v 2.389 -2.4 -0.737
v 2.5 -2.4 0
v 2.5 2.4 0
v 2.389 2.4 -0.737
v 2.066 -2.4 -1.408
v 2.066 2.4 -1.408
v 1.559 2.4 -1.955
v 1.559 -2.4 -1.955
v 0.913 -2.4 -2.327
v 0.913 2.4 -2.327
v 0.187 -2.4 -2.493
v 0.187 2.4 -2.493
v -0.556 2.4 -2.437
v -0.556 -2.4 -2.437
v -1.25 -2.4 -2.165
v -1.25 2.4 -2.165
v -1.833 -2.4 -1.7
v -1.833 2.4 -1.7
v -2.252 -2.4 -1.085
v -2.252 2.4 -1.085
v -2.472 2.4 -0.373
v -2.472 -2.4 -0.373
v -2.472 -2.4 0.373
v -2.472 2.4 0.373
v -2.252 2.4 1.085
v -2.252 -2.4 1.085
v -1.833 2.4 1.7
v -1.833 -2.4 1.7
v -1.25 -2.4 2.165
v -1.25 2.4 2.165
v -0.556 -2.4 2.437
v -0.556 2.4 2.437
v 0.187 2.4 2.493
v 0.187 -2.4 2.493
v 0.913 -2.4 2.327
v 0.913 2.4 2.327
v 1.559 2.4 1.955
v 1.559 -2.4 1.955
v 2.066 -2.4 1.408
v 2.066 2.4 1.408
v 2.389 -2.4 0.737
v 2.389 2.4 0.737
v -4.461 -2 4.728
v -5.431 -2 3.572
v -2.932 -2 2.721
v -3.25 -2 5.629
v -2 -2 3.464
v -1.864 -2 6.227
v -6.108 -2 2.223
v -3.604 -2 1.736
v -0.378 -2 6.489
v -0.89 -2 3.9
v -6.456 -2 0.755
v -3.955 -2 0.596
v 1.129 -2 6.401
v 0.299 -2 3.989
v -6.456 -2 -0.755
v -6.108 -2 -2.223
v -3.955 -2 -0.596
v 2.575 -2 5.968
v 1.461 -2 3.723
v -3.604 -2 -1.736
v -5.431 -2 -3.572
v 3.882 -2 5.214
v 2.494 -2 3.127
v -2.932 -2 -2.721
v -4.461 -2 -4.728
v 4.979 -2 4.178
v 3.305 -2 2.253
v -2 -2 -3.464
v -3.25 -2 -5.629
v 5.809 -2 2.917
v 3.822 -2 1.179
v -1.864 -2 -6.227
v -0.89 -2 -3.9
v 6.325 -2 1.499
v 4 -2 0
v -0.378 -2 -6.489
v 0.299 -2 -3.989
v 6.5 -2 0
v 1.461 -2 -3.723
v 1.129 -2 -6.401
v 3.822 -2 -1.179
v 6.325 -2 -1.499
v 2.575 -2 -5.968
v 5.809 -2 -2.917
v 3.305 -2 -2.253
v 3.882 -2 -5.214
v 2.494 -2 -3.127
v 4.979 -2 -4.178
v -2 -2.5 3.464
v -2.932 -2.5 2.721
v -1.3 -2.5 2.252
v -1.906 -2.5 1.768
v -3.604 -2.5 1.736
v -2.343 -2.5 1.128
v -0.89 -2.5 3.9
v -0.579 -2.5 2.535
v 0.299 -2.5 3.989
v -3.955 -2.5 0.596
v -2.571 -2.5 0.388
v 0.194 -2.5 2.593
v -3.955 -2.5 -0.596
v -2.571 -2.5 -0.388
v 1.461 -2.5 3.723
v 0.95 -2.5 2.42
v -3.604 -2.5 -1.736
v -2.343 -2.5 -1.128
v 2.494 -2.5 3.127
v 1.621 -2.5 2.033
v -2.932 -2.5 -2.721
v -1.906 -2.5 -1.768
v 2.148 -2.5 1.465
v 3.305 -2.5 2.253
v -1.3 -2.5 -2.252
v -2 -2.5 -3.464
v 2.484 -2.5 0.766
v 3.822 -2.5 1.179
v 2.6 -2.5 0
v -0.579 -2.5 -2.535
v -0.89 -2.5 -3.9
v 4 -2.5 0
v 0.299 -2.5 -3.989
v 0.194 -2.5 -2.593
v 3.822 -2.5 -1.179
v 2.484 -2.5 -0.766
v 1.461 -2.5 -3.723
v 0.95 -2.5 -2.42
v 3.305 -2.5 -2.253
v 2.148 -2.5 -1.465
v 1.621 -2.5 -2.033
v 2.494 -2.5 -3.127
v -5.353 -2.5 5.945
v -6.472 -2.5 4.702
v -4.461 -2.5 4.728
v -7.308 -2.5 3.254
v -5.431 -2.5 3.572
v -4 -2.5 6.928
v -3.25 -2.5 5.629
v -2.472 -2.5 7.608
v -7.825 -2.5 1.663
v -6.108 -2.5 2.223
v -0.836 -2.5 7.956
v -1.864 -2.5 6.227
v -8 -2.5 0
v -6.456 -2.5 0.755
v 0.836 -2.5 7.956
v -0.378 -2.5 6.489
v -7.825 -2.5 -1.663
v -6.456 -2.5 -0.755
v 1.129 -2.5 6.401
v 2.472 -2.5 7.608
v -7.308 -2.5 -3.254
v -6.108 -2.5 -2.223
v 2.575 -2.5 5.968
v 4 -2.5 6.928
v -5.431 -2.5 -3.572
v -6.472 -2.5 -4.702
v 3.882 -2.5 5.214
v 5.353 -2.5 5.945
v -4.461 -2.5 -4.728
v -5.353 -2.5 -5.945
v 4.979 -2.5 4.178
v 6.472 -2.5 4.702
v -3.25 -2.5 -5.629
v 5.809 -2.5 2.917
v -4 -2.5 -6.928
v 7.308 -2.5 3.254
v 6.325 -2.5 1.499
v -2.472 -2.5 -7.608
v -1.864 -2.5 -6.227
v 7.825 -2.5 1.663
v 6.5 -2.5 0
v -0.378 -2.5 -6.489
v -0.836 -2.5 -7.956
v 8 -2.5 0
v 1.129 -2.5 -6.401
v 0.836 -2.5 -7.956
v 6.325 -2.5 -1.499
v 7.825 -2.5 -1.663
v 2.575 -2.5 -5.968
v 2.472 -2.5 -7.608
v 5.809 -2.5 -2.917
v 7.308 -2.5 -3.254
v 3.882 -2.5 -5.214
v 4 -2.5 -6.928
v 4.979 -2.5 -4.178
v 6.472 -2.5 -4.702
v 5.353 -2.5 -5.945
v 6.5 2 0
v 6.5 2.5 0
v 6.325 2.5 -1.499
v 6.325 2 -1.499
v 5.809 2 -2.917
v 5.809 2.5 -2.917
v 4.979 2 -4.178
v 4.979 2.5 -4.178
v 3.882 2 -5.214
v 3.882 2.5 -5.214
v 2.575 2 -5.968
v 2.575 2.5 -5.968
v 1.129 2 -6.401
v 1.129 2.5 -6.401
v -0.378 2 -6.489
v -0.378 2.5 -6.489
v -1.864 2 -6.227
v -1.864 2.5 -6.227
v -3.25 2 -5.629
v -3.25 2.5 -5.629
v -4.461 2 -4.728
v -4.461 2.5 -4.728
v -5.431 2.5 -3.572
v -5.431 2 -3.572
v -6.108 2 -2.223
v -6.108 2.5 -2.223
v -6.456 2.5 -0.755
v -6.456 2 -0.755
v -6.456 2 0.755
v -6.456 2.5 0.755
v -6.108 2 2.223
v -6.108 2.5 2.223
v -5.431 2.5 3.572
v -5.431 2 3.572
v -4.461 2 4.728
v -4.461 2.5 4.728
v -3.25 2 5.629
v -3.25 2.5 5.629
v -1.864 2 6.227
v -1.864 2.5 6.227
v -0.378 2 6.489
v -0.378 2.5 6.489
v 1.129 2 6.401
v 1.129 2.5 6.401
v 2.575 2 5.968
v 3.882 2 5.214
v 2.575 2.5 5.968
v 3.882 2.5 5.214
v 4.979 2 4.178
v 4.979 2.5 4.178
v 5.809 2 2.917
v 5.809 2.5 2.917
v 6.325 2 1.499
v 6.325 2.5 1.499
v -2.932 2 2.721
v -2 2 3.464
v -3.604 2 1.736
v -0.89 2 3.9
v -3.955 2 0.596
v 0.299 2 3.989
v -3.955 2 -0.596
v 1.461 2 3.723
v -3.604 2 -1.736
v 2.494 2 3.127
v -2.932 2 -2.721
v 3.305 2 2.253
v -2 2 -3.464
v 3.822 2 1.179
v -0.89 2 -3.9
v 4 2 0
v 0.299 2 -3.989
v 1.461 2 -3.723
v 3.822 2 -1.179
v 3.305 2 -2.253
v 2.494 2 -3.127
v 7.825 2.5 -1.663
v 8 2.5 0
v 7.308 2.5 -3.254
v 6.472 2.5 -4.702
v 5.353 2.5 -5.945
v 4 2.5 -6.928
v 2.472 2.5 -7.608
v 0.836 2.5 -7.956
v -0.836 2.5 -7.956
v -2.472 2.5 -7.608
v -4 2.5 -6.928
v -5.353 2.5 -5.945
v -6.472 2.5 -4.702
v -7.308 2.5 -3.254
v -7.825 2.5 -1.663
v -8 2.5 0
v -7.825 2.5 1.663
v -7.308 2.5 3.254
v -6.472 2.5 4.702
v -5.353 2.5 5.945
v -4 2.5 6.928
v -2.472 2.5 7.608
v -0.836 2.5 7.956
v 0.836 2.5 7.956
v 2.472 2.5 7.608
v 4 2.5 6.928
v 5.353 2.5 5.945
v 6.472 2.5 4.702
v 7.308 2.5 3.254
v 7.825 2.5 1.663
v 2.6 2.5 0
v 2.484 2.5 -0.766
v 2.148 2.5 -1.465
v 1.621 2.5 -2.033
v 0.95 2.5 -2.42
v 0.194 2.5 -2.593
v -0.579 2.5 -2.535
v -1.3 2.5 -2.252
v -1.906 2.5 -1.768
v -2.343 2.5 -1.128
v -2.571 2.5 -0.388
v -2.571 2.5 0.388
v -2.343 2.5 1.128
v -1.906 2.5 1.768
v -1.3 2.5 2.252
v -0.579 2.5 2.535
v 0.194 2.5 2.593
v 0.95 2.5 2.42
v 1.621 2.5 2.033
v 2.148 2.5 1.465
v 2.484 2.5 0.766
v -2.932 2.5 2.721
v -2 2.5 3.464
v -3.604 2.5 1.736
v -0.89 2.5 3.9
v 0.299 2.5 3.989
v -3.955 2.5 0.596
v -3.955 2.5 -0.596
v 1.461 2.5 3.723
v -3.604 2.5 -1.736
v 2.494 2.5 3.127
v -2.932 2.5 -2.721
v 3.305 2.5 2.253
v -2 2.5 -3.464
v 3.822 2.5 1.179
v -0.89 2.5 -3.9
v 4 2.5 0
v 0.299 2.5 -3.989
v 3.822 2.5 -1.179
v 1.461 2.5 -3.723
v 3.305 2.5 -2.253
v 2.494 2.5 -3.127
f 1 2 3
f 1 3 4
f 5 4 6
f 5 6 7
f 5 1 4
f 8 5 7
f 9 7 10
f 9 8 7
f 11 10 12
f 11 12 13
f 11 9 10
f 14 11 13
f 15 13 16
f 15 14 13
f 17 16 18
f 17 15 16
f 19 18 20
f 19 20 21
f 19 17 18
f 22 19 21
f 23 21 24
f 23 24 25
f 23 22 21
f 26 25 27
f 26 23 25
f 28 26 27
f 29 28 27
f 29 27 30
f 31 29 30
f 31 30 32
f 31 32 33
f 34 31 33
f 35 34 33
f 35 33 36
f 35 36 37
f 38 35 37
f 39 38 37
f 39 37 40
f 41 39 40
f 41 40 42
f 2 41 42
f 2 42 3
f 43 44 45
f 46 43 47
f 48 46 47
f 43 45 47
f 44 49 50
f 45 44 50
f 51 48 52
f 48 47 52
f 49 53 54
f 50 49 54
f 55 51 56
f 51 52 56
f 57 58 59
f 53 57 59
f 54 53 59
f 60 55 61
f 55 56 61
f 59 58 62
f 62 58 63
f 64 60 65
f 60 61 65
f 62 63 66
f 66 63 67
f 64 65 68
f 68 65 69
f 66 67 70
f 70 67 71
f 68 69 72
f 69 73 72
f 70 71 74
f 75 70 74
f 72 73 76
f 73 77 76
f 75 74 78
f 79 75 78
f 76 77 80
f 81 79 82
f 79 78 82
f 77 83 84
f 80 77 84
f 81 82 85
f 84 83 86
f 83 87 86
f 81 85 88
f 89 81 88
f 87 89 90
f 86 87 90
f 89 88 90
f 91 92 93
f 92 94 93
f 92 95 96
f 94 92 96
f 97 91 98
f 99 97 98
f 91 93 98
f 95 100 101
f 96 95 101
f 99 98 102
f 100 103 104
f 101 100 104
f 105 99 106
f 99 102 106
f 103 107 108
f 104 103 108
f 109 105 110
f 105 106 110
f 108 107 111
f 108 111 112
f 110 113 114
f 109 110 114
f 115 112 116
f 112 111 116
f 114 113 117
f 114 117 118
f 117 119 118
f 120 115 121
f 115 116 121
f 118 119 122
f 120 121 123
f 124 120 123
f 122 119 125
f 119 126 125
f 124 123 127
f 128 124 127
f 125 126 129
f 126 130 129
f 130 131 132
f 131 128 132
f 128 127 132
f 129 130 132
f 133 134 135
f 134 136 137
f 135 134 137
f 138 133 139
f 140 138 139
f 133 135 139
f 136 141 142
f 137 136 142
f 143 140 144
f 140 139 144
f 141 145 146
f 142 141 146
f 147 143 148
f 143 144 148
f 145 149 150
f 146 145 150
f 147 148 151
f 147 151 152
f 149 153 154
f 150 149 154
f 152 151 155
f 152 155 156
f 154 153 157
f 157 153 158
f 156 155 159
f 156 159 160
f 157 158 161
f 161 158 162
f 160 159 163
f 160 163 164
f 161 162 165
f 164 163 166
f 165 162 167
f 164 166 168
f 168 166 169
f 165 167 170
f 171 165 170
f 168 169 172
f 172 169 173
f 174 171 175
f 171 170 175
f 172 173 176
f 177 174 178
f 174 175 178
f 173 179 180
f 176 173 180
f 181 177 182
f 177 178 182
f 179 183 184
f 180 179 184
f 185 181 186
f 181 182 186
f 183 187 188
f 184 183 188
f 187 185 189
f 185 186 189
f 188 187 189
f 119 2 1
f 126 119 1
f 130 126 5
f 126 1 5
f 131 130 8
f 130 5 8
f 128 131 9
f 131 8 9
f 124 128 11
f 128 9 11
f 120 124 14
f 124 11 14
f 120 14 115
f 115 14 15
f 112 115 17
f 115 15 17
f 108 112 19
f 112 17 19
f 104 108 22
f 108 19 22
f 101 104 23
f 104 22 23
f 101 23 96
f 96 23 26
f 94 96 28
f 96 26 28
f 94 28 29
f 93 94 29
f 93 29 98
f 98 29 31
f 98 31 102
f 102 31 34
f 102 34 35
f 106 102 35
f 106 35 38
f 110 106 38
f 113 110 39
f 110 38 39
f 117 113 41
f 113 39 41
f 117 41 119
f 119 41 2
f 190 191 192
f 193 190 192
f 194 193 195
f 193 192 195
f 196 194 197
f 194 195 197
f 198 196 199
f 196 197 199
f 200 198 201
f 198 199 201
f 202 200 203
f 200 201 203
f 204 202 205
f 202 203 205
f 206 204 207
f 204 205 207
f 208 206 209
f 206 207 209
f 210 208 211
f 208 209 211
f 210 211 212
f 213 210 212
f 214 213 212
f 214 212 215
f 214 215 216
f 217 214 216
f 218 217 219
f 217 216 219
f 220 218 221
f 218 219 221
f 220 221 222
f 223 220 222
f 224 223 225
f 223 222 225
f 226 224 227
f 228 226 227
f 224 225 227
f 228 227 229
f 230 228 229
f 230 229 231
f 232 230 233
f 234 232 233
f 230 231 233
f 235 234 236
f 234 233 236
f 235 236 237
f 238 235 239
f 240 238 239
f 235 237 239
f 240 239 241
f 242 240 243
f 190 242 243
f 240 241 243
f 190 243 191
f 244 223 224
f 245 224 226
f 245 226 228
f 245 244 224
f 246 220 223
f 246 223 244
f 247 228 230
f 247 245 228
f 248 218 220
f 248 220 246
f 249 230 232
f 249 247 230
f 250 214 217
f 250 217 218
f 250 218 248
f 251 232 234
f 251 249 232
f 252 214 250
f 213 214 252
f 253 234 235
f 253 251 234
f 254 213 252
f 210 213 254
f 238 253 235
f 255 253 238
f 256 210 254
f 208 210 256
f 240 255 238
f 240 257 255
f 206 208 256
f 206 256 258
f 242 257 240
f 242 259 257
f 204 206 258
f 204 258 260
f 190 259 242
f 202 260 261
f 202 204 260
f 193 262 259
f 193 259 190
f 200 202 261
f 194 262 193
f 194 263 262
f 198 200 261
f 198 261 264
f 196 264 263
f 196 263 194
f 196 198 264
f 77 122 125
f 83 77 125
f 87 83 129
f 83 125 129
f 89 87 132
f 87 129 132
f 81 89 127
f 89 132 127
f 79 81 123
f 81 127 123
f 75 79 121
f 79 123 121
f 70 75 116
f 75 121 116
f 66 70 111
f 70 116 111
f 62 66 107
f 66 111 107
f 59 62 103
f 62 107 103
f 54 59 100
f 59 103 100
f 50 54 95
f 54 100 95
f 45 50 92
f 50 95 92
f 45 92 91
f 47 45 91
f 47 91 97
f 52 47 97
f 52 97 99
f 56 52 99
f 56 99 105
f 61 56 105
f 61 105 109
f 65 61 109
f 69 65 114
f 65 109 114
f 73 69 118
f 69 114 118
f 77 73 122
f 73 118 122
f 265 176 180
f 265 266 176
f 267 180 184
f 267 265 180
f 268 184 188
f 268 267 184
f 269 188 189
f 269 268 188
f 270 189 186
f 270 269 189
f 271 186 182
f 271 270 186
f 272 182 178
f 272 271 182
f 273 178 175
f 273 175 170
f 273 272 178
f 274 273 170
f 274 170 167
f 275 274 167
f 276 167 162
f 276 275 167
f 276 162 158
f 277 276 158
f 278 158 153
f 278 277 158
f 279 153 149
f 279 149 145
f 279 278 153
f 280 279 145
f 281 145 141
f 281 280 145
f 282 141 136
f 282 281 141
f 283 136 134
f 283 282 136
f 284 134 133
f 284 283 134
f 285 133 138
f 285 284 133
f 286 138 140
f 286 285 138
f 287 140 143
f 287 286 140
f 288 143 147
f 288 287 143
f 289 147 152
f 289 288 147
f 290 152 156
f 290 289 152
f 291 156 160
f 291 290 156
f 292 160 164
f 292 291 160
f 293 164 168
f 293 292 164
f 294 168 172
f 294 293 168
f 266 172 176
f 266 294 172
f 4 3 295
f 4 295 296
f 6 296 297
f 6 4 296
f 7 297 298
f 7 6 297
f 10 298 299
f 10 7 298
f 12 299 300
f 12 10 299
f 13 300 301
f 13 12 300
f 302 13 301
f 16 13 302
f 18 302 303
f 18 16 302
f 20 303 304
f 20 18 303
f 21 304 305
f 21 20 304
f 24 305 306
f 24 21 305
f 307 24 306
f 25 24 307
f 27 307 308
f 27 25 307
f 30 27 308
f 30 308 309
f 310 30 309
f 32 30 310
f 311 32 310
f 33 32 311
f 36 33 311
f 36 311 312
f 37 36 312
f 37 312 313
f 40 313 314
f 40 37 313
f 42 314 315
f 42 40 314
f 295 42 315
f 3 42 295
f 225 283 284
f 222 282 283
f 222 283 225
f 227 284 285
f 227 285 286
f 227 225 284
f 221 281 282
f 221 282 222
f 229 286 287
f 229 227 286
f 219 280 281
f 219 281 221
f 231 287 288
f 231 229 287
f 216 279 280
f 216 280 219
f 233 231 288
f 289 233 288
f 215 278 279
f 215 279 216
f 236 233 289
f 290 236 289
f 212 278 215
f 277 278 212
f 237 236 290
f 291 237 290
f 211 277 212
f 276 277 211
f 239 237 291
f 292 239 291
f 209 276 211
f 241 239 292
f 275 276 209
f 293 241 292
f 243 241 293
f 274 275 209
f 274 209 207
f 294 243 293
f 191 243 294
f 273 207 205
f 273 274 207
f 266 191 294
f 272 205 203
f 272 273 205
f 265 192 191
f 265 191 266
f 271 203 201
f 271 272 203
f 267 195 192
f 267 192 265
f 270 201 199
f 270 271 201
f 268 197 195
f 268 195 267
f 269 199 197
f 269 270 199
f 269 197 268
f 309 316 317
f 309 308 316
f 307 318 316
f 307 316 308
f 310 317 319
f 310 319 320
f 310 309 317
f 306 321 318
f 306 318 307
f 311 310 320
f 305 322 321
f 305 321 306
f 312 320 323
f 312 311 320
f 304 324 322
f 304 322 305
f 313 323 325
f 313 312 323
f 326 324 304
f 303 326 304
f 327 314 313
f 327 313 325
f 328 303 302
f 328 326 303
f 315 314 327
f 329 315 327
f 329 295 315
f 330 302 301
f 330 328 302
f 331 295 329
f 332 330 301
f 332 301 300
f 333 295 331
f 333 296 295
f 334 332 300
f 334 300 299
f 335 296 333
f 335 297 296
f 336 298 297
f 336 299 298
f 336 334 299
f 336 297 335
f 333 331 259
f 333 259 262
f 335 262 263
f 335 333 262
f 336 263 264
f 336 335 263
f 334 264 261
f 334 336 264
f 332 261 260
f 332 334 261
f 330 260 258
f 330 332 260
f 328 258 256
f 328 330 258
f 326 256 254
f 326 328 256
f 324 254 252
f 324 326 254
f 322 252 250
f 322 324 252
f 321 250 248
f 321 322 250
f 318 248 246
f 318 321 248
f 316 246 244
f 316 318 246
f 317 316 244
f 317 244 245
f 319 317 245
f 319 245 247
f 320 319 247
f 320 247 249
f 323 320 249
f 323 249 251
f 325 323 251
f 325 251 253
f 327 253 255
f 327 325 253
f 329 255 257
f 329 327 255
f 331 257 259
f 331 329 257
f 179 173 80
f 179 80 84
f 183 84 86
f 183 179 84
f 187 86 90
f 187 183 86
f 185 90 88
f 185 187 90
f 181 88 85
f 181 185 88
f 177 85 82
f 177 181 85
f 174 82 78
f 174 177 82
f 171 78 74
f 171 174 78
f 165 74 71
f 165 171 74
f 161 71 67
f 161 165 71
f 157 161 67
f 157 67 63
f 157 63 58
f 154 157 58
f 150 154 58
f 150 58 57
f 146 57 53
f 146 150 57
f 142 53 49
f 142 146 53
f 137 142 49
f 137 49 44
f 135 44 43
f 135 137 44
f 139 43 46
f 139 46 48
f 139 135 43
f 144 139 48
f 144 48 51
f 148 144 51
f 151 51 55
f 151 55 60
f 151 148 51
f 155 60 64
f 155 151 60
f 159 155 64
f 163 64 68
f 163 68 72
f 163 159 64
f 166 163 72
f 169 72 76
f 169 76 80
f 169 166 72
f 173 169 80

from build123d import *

# Parameters (mm, degrees)
SKETCH1_R           = 8
SKETCH1_R_2         = 2.5
BOSS_EXTRUDE1_DEPTH = 2.5
SKETCH2_R           = 6.5
SKETCH2_R_2         = 4
CUT_EXTRUDE1_DEPTH  = 0.5
CHAMFER1_SIZE       = 0.1


with BuildPart() as part:
    # Sketch1 → Boss-Extrude1 (new body, symmetric)
    with BuildSketch(Plane(origin=(0, 0, 0), x_dir=(1, 0, 0), z_dir=(0, 1, 0))):
        Circle(SKETCH1_R)
        Circle(SKETCH1_R_2, mode=Mode.SUBTRACT)
    extrude(amount=BOSS_EXTRUDE1_DEPTH, both=True)

    # Sketch2 → Cut-Extrude1 (cut)
    with BuildSketch(Plane(origin=(0, 2.5, 0), x_dir=(1, 0, 0), z_dir=(0, 1, 0))):
        Circle(SKETCH2_R)
        Circle(SKETCH2_R_2, mode=Mode.SUBTRACT)
    cut_extrude1 = extrude(amount=-CUT_EXTRUDE1_DEPTH, mode=Mode.SUBTRACT)

    # Mirror1: Cut-Extrude1 across plane
    add(cut_extrude1.mirror(Plane.ZX), mode=Mode.SUBTRACT)

    # Chamfer1
    chamfer1_edges = [part.edges().sort_by_distance(p)[0] for p in [
        (-2.5, -2.5, 0),
        (-2.5, 2.5, 0),
    ]]
    chamfer(chamfer1_edges, length=CHAMFER1_SIZE)


solid = part.part
